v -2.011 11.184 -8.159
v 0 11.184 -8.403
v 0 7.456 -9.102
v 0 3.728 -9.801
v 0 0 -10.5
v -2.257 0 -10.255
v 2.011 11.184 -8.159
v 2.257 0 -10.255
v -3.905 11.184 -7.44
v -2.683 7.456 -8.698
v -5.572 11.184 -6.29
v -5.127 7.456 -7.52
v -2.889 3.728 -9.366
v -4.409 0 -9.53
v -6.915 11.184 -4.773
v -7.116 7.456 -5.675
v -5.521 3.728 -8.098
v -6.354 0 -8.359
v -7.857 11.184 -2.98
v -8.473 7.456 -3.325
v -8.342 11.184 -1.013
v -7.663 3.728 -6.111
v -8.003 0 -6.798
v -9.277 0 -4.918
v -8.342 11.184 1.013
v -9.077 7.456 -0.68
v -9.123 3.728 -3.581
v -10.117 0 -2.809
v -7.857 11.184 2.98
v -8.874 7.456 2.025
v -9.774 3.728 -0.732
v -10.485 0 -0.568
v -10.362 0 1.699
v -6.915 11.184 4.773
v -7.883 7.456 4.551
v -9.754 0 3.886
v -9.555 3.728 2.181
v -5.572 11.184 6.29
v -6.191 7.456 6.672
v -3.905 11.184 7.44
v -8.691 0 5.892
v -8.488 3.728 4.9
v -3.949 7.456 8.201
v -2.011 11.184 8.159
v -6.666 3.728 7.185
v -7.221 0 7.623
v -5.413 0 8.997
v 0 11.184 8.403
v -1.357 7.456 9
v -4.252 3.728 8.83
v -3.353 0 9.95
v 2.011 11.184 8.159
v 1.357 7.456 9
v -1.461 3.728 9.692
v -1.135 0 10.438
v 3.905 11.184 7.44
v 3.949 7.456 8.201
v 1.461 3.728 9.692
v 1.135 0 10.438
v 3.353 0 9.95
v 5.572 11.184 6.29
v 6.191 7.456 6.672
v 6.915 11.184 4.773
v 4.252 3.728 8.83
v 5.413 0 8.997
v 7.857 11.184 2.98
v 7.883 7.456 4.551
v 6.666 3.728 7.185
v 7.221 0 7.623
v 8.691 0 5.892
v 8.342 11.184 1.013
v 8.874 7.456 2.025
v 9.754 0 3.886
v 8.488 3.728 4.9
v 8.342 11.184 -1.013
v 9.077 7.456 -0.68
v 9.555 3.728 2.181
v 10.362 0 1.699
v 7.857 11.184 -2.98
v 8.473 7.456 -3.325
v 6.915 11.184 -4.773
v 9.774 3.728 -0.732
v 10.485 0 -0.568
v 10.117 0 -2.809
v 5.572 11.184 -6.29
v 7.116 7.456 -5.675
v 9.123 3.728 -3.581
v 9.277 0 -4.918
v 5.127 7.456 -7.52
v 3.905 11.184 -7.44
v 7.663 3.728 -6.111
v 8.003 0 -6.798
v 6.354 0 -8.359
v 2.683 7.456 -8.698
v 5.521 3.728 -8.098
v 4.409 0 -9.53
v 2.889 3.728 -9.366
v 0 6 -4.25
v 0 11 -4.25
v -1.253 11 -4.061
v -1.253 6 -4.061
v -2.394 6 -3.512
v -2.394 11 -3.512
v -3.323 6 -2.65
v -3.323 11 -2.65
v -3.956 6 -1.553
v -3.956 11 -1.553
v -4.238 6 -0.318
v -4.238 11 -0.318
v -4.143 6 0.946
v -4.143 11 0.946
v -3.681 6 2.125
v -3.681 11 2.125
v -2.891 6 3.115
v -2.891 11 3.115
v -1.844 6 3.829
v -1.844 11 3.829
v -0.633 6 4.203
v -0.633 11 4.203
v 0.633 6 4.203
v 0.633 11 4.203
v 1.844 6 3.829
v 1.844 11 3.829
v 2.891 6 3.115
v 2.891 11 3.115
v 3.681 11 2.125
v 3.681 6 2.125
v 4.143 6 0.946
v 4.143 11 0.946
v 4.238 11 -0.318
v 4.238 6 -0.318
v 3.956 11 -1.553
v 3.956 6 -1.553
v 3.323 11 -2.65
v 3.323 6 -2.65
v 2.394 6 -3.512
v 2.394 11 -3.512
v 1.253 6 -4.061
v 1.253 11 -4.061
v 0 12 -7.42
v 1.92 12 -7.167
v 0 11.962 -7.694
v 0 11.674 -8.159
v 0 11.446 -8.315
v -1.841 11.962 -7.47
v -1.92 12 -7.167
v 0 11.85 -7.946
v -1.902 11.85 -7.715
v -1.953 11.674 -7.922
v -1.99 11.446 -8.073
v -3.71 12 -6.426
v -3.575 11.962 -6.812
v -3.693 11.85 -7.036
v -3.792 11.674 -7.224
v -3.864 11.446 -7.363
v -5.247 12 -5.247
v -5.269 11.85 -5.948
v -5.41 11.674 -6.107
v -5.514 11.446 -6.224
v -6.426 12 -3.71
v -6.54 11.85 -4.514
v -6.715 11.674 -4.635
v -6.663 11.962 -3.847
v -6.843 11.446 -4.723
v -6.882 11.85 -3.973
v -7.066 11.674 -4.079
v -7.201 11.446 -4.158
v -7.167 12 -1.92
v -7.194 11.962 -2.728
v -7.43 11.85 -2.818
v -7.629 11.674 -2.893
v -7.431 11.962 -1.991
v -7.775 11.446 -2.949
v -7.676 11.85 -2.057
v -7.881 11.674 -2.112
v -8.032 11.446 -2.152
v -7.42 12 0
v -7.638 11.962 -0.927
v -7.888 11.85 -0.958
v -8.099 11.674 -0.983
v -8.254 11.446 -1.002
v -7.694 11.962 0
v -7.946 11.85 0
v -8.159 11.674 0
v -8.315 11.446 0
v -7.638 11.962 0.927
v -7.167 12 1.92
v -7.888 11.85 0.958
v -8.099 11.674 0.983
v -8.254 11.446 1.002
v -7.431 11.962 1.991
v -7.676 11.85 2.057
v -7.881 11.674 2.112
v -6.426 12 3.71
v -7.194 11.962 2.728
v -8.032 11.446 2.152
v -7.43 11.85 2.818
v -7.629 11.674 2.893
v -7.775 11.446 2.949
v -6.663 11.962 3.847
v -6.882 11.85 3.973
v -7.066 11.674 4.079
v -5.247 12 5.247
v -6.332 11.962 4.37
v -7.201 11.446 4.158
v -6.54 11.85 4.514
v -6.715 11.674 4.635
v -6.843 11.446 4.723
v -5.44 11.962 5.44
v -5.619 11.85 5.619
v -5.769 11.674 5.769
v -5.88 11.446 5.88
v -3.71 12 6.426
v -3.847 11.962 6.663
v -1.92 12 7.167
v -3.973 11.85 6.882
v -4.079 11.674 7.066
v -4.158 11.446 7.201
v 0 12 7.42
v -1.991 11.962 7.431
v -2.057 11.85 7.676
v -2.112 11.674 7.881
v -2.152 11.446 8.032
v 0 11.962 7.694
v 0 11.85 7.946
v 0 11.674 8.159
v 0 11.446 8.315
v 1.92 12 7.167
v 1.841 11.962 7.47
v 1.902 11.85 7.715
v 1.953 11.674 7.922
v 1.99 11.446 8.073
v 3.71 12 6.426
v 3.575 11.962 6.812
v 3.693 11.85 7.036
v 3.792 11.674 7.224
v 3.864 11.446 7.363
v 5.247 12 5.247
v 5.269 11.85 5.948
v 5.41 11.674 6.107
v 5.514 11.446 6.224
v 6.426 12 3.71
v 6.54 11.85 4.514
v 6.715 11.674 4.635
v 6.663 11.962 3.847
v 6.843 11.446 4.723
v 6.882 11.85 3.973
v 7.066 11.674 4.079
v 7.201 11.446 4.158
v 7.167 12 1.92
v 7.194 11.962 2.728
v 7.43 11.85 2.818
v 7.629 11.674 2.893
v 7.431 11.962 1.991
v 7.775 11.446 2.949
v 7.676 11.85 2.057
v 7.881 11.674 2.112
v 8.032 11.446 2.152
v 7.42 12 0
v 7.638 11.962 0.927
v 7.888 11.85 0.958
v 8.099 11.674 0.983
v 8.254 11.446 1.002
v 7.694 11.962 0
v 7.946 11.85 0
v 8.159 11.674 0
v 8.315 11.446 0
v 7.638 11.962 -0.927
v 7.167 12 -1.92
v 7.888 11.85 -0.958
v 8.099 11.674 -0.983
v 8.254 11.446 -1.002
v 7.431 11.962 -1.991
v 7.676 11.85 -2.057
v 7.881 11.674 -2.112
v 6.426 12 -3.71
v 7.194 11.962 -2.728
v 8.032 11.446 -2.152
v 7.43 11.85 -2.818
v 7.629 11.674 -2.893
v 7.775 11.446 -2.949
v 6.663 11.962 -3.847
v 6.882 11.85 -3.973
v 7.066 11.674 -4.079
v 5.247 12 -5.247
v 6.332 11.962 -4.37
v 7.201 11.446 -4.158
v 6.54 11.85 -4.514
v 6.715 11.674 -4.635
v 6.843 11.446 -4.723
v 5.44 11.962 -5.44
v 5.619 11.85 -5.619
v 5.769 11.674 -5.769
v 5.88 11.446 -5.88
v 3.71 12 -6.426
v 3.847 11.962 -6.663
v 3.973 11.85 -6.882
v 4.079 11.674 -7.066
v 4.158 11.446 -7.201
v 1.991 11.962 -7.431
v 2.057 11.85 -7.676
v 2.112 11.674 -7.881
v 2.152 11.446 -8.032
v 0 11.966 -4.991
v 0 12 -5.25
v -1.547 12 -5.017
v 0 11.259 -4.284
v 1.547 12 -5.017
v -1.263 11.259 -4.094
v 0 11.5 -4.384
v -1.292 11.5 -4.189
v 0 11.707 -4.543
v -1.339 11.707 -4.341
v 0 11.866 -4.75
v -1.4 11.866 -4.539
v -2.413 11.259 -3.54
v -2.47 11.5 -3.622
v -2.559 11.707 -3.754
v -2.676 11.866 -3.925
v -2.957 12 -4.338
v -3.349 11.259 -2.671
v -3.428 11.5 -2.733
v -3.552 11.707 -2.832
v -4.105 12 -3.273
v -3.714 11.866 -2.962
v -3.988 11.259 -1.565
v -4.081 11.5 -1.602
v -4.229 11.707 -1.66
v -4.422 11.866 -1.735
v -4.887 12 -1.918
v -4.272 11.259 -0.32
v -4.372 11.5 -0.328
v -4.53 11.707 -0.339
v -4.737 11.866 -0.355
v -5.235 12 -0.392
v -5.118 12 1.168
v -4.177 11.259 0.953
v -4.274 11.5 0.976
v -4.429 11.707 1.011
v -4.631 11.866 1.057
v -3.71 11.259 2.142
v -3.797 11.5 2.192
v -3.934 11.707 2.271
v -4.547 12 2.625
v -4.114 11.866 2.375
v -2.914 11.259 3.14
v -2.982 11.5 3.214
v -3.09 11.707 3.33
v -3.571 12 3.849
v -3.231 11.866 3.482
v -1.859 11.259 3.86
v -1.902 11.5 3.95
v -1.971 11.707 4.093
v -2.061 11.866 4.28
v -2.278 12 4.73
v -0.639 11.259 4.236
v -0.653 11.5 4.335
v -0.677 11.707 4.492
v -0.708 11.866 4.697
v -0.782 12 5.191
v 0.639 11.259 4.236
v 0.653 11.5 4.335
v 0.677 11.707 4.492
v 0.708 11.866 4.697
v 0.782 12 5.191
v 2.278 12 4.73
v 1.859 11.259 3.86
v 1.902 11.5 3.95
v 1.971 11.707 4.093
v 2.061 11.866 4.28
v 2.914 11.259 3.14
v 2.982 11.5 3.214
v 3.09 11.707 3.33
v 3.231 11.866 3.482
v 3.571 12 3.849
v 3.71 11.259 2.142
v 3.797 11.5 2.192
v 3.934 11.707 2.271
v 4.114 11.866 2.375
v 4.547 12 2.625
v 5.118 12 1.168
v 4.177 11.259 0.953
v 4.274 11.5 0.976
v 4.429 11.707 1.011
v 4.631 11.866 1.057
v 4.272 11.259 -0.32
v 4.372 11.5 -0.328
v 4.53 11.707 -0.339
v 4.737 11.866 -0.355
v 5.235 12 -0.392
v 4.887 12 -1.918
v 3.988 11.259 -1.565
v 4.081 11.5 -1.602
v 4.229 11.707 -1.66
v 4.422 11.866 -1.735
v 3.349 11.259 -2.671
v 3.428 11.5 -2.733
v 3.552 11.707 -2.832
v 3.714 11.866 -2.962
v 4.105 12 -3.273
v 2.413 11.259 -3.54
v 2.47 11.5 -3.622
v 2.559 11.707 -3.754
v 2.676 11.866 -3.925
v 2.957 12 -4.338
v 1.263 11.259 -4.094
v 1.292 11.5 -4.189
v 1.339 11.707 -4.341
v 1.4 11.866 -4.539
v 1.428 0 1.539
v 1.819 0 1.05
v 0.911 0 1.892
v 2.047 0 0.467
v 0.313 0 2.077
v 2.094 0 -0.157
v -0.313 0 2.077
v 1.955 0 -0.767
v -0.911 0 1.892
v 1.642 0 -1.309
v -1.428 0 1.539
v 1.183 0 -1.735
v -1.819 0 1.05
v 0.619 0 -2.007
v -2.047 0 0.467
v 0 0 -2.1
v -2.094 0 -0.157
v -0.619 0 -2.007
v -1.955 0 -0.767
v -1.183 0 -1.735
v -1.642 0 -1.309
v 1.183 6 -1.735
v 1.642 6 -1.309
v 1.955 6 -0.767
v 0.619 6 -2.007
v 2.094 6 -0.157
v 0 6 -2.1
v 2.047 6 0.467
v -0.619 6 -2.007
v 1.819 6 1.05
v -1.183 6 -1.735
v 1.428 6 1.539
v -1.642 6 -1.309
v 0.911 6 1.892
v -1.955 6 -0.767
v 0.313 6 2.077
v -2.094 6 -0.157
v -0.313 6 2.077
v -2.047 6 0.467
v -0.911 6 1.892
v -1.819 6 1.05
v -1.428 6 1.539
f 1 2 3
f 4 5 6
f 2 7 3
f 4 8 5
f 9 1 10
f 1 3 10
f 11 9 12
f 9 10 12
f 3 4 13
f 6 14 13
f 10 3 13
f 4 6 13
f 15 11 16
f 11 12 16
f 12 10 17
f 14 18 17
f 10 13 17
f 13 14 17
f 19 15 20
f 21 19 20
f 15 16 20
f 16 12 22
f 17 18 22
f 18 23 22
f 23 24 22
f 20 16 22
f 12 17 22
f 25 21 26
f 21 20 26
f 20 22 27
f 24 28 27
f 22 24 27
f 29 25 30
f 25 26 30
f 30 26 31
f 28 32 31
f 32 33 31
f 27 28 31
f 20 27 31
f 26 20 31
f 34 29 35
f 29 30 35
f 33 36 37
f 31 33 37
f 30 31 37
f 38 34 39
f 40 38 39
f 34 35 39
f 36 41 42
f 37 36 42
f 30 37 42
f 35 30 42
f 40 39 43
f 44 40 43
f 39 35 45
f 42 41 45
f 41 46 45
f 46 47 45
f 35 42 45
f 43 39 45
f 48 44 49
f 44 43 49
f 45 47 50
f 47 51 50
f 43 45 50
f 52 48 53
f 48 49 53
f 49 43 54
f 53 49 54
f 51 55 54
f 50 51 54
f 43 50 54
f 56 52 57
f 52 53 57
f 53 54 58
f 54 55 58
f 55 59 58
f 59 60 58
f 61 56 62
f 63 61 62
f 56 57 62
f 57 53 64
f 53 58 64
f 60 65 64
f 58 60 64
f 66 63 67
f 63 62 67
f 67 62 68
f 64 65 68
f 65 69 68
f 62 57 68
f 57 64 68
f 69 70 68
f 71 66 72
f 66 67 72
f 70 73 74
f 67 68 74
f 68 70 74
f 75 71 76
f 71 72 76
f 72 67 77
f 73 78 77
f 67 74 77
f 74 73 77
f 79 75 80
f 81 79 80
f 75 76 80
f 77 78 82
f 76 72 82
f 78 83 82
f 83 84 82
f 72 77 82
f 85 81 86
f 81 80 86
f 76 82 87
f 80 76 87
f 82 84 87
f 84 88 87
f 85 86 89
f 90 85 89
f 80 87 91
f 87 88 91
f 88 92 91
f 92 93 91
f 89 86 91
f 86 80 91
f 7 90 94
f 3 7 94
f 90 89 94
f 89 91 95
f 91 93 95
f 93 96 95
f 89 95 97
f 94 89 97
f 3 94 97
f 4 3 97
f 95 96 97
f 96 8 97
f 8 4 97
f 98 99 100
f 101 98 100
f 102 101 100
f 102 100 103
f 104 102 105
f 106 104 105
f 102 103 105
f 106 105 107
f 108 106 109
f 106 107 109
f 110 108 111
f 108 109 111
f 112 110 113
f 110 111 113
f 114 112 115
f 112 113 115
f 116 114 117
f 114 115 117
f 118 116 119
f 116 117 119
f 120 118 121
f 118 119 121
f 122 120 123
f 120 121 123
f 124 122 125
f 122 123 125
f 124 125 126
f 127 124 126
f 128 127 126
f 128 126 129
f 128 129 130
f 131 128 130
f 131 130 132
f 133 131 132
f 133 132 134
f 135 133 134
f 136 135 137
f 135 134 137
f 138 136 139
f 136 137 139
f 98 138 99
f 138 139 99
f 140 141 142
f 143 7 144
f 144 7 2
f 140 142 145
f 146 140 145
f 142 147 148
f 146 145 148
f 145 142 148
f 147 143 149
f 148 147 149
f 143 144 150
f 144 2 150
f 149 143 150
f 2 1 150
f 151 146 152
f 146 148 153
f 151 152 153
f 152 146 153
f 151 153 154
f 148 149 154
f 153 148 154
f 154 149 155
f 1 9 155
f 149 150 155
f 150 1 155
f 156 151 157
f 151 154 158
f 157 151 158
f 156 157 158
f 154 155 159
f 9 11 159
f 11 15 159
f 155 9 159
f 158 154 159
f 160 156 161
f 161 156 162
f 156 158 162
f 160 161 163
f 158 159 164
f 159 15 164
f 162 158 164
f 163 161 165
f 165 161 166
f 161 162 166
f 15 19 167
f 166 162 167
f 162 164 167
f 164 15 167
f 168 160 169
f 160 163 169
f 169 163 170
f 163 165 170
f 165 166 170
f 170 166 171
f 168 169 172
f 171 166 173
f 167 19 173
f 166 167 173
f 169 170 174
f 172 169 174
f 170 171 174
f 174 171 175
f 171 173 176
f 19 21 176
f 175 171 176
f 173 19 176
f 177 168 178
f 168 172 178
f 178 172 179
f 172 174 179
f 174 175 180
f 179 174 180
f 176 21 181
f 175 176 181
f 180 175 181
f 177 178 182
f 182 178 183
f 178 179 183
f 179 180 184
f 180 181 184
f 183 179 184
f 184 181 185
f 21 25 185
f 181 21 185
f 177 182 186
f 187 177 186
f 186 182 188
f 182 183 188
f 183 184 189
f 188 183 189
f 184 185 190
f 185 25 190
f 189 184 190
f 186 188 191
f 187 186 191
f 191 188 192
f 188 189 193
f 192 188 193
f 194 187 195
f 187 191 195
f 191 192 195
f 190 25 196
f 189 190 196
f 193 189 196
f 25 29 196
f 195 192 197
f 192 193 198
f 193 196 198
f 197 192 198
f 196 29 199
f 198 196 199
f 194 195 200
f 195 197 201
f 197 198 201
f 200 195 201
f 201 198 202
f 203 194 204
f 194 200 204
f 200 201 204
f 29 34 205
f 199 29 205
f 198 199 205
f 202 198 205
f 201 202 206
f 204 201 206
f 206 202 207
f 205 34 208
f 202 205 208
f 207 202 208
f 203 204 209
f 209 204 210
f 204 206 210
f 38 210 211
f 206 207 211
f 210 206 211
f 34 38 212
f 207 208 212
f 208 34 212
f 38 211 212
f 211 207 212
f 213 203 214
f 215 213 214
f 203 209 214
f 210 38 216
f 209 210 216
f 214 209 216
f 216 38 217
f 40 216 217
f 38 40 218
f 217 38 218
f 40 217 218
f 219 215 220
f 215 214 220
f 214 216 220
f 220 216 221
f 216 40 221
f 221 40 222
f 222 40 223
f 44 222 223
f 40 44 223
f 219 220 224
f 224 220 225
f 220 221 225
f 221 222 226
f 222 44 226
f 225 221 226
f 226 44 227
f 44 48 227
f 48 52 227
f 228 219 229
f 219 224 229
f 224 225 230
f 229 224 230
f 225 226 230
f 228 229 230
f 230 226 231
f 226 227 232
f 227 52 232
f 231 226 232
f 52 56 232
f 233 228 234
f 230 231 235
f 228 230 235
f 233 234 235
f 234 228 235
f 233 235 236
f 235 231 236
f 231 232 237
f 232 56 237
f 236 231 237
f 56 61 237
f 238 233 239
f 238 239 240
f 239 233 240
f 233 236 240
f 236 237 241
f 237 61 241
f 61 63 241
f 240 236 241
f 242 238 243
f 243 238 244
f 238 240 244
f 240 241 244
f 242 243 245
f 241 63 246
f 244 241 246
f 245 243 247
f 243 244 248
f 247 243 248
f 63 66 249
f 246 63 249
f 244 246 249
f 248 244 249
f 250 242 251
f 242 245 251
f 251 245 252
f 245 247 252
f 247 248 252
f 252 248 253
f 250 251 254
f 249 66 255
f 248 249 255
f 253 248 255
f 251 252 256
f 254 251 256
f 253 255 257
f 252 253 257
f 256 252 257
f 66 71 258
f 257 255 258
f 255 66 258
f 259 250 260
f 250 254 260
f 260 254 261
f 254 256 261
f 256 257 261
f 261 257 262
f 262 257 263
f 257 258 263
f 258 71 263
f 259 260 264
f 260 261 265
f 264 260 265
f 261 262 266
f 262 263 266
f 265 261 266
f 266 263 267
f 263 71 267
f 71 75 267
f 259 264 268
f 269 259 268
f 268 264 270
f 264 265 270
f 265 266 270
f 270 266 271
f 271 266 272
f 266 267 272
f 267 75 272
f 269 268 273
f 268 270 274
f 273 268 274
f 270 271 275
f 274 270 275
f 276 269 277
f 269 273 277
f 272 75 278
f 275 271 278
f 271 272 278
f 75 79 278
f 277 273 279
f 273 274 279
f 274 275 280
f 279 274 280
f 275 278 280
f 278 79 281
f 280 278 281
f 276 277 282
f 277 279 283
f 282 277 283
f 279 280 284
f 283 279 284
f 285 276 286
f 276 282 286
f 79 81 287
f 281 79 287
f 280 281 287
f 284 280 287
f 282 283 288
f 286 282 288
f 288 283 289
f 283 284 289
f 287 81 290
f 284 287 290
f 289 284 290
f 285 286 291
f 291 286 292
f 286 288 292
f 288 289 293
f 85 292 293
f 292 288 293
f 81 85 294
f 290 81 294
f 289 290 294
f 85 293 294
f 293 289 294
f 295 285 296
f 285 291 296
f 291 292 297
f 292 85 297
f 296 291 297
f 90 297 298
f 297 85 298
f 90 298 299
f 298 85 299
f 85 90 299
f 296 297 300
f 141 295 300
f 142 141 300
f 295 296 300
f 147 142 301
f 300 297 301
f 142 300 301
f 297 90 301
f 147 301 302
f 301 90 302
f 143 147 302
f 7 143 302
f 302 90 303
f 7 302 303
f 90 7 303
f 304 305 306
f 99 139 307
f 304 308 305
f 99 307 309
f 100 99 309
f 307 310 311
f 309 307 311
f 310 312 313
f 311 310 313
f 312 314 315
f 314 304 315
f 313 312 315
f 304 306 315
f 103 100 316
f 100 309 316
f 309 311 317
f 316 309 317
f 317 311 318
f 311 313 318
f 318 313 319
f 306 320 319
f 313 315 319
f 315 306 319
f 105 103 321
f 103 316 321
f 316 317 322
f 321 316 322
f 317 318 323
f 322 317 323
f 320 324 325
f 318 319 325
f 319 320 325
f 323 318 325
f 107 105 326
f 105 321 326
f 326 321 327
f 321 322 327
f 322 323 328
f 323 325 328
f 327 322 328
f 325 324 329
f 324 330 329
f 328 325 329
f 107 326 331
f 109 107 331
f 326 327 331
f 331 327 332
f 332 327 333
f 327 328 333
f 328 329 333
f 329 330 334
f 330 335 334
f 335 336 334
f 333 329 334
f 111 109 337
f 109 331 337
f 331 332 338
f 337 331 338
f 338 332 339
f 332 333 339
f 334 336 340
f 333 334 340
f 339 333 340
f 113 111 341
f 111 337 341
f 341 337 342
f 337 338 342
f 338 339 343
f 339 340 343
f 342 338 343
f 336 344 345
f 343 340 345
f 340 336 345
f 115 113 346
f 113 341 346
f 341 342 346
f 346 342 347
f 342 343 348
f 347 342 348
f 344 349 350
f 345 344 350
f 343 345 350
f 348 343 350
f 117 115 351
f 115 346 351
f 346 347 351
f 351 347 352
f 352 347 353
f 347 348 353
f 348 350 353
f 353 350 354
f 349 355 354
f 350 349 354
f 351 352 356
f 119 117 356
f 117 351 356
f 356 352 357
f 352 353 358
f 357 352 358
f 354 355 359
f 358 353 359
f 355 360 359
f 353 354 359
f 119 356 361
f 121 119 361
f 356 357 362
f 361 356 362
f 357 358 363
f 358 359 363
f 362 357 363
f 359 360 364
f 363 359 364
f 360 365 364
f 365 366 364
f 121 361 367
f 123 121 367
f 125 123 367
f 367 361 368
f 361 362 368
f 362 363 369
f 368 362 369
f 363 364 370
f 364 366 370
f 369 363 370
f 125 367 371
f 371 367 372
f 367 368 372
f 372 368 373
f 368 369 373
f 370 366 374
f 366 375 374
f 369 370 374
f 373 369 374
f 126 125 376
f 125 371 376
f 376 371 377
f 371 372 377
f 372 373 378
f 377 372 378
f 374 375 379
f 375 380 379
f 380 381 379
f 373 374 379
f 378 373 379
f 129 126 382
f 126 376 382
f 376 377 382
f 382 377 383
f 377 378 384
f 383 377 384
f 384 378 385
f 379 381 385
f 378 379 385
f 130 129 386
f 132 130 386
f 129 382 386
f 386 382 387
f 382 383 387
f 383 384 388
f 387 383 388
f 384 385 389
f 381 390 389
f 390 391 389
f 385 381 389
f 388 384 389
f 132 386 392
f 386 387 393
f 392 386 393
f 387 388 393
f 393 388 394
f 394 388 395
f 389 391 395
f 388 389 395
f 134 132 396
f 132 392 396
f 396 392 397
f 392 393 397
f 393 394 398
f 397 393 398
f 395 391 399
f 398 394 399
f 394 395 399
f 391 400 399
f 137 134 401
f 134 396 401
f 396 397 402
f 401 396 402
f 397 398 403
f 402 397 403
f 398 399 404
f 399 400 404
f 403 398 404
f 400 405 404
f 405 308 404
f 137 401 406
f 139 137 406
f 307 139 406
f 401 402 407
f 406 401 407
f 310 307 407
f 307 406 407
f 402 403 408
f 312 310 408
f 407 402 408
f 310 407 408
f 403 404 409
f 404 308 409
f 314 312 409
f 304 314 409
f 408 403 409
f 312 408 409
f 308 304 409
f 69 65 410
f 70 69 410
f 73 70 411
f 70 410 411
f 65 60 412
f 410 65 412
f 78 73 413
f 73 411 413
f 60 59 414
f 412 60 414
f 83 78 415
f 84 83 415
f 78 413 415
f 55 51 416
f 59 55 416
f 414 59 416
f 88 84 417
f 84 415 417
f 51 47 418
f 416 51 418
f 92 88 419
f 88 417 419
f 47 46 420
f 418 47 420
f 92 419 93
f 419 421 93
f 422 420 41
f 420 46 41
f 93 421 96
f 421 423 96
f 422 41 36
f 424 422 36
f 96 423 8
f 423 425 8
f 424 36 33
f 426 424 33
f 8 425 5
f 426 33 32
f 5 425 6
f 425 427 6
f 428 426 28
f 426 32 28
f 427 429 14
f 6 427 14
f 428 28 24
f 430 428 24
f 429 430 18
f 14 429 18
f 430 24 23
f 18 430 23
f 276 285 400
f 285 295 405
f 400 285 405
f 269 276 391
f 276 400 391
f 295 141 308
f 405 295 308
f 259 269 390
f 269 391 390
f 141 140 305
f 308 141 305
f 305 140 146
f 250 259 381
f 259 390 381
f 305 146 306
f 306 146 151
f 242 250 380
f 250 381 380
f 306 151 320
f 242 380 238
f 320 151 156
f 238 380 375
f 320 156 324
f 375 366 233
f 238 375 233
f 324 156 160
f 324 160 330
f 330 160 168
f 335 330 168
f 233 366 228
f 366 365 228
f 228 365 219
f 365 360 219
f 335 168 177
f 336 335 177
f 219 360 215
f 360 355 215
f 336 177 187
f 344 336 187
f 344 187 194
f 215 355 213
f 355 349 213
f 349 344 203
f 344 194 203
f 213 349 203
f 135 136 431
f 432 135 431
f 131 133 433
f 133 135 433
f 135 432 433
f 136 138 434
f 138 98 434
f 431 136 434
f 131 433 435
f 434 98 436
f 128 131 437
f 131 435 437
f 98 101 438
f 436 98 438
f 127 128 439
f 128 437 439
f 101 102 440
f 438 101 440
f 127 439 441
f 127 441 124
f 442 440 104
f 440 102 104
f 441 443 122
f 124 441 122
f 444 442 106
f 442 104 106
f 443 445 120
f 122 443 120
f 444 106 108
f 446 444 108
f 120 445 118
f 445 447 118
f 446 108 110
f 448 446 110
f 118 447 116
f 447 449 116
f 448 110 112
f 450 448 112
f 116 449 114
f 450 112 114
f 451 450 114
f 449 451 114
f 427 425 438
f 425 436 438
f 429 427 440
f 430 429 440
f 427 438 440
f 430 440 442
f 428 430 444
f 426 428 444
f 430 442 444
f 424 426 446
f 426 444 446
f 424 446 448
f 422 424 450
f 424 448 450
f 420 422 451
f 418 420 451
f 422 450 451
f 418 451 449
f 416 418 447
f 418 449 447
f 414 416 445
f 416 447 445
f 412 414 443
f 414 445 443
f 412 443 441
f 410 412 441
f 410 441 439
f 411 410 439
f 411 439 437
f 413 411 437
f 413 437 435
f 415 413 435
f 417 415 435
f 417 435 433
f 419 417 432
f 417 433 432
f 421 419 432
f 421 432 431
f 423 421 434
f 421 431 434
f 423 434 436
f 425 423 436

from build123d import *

# Parameters (mm, degrees)
FILLET1_R = 1


with BuildPart() as part:
    # Sketch1 → Revolve1 (revolve)
    with BuildSketch(Plane(origin=(0, 0, 0), x_dir=(0, 0, -1), z_dir=(1, 0, 0))):
        Polygon((2.1, 6), (4.25, 6), (4.25, 12), (8.25, 12), (10.5, 0), (2.1, 0), align=None)
    revolve(axis=Axis((0, 0, 0), (0, 1, 0)))

    # Fillet1
    fillet1_edges = [part.edges().sort_by_distance(p)[0] for p in [
        (0, 12, 8.25),
        (0, 12, 4.25),
    ]]
    fillet(fillet1_edges, radius=FILLET1_R)


solid = part.part
